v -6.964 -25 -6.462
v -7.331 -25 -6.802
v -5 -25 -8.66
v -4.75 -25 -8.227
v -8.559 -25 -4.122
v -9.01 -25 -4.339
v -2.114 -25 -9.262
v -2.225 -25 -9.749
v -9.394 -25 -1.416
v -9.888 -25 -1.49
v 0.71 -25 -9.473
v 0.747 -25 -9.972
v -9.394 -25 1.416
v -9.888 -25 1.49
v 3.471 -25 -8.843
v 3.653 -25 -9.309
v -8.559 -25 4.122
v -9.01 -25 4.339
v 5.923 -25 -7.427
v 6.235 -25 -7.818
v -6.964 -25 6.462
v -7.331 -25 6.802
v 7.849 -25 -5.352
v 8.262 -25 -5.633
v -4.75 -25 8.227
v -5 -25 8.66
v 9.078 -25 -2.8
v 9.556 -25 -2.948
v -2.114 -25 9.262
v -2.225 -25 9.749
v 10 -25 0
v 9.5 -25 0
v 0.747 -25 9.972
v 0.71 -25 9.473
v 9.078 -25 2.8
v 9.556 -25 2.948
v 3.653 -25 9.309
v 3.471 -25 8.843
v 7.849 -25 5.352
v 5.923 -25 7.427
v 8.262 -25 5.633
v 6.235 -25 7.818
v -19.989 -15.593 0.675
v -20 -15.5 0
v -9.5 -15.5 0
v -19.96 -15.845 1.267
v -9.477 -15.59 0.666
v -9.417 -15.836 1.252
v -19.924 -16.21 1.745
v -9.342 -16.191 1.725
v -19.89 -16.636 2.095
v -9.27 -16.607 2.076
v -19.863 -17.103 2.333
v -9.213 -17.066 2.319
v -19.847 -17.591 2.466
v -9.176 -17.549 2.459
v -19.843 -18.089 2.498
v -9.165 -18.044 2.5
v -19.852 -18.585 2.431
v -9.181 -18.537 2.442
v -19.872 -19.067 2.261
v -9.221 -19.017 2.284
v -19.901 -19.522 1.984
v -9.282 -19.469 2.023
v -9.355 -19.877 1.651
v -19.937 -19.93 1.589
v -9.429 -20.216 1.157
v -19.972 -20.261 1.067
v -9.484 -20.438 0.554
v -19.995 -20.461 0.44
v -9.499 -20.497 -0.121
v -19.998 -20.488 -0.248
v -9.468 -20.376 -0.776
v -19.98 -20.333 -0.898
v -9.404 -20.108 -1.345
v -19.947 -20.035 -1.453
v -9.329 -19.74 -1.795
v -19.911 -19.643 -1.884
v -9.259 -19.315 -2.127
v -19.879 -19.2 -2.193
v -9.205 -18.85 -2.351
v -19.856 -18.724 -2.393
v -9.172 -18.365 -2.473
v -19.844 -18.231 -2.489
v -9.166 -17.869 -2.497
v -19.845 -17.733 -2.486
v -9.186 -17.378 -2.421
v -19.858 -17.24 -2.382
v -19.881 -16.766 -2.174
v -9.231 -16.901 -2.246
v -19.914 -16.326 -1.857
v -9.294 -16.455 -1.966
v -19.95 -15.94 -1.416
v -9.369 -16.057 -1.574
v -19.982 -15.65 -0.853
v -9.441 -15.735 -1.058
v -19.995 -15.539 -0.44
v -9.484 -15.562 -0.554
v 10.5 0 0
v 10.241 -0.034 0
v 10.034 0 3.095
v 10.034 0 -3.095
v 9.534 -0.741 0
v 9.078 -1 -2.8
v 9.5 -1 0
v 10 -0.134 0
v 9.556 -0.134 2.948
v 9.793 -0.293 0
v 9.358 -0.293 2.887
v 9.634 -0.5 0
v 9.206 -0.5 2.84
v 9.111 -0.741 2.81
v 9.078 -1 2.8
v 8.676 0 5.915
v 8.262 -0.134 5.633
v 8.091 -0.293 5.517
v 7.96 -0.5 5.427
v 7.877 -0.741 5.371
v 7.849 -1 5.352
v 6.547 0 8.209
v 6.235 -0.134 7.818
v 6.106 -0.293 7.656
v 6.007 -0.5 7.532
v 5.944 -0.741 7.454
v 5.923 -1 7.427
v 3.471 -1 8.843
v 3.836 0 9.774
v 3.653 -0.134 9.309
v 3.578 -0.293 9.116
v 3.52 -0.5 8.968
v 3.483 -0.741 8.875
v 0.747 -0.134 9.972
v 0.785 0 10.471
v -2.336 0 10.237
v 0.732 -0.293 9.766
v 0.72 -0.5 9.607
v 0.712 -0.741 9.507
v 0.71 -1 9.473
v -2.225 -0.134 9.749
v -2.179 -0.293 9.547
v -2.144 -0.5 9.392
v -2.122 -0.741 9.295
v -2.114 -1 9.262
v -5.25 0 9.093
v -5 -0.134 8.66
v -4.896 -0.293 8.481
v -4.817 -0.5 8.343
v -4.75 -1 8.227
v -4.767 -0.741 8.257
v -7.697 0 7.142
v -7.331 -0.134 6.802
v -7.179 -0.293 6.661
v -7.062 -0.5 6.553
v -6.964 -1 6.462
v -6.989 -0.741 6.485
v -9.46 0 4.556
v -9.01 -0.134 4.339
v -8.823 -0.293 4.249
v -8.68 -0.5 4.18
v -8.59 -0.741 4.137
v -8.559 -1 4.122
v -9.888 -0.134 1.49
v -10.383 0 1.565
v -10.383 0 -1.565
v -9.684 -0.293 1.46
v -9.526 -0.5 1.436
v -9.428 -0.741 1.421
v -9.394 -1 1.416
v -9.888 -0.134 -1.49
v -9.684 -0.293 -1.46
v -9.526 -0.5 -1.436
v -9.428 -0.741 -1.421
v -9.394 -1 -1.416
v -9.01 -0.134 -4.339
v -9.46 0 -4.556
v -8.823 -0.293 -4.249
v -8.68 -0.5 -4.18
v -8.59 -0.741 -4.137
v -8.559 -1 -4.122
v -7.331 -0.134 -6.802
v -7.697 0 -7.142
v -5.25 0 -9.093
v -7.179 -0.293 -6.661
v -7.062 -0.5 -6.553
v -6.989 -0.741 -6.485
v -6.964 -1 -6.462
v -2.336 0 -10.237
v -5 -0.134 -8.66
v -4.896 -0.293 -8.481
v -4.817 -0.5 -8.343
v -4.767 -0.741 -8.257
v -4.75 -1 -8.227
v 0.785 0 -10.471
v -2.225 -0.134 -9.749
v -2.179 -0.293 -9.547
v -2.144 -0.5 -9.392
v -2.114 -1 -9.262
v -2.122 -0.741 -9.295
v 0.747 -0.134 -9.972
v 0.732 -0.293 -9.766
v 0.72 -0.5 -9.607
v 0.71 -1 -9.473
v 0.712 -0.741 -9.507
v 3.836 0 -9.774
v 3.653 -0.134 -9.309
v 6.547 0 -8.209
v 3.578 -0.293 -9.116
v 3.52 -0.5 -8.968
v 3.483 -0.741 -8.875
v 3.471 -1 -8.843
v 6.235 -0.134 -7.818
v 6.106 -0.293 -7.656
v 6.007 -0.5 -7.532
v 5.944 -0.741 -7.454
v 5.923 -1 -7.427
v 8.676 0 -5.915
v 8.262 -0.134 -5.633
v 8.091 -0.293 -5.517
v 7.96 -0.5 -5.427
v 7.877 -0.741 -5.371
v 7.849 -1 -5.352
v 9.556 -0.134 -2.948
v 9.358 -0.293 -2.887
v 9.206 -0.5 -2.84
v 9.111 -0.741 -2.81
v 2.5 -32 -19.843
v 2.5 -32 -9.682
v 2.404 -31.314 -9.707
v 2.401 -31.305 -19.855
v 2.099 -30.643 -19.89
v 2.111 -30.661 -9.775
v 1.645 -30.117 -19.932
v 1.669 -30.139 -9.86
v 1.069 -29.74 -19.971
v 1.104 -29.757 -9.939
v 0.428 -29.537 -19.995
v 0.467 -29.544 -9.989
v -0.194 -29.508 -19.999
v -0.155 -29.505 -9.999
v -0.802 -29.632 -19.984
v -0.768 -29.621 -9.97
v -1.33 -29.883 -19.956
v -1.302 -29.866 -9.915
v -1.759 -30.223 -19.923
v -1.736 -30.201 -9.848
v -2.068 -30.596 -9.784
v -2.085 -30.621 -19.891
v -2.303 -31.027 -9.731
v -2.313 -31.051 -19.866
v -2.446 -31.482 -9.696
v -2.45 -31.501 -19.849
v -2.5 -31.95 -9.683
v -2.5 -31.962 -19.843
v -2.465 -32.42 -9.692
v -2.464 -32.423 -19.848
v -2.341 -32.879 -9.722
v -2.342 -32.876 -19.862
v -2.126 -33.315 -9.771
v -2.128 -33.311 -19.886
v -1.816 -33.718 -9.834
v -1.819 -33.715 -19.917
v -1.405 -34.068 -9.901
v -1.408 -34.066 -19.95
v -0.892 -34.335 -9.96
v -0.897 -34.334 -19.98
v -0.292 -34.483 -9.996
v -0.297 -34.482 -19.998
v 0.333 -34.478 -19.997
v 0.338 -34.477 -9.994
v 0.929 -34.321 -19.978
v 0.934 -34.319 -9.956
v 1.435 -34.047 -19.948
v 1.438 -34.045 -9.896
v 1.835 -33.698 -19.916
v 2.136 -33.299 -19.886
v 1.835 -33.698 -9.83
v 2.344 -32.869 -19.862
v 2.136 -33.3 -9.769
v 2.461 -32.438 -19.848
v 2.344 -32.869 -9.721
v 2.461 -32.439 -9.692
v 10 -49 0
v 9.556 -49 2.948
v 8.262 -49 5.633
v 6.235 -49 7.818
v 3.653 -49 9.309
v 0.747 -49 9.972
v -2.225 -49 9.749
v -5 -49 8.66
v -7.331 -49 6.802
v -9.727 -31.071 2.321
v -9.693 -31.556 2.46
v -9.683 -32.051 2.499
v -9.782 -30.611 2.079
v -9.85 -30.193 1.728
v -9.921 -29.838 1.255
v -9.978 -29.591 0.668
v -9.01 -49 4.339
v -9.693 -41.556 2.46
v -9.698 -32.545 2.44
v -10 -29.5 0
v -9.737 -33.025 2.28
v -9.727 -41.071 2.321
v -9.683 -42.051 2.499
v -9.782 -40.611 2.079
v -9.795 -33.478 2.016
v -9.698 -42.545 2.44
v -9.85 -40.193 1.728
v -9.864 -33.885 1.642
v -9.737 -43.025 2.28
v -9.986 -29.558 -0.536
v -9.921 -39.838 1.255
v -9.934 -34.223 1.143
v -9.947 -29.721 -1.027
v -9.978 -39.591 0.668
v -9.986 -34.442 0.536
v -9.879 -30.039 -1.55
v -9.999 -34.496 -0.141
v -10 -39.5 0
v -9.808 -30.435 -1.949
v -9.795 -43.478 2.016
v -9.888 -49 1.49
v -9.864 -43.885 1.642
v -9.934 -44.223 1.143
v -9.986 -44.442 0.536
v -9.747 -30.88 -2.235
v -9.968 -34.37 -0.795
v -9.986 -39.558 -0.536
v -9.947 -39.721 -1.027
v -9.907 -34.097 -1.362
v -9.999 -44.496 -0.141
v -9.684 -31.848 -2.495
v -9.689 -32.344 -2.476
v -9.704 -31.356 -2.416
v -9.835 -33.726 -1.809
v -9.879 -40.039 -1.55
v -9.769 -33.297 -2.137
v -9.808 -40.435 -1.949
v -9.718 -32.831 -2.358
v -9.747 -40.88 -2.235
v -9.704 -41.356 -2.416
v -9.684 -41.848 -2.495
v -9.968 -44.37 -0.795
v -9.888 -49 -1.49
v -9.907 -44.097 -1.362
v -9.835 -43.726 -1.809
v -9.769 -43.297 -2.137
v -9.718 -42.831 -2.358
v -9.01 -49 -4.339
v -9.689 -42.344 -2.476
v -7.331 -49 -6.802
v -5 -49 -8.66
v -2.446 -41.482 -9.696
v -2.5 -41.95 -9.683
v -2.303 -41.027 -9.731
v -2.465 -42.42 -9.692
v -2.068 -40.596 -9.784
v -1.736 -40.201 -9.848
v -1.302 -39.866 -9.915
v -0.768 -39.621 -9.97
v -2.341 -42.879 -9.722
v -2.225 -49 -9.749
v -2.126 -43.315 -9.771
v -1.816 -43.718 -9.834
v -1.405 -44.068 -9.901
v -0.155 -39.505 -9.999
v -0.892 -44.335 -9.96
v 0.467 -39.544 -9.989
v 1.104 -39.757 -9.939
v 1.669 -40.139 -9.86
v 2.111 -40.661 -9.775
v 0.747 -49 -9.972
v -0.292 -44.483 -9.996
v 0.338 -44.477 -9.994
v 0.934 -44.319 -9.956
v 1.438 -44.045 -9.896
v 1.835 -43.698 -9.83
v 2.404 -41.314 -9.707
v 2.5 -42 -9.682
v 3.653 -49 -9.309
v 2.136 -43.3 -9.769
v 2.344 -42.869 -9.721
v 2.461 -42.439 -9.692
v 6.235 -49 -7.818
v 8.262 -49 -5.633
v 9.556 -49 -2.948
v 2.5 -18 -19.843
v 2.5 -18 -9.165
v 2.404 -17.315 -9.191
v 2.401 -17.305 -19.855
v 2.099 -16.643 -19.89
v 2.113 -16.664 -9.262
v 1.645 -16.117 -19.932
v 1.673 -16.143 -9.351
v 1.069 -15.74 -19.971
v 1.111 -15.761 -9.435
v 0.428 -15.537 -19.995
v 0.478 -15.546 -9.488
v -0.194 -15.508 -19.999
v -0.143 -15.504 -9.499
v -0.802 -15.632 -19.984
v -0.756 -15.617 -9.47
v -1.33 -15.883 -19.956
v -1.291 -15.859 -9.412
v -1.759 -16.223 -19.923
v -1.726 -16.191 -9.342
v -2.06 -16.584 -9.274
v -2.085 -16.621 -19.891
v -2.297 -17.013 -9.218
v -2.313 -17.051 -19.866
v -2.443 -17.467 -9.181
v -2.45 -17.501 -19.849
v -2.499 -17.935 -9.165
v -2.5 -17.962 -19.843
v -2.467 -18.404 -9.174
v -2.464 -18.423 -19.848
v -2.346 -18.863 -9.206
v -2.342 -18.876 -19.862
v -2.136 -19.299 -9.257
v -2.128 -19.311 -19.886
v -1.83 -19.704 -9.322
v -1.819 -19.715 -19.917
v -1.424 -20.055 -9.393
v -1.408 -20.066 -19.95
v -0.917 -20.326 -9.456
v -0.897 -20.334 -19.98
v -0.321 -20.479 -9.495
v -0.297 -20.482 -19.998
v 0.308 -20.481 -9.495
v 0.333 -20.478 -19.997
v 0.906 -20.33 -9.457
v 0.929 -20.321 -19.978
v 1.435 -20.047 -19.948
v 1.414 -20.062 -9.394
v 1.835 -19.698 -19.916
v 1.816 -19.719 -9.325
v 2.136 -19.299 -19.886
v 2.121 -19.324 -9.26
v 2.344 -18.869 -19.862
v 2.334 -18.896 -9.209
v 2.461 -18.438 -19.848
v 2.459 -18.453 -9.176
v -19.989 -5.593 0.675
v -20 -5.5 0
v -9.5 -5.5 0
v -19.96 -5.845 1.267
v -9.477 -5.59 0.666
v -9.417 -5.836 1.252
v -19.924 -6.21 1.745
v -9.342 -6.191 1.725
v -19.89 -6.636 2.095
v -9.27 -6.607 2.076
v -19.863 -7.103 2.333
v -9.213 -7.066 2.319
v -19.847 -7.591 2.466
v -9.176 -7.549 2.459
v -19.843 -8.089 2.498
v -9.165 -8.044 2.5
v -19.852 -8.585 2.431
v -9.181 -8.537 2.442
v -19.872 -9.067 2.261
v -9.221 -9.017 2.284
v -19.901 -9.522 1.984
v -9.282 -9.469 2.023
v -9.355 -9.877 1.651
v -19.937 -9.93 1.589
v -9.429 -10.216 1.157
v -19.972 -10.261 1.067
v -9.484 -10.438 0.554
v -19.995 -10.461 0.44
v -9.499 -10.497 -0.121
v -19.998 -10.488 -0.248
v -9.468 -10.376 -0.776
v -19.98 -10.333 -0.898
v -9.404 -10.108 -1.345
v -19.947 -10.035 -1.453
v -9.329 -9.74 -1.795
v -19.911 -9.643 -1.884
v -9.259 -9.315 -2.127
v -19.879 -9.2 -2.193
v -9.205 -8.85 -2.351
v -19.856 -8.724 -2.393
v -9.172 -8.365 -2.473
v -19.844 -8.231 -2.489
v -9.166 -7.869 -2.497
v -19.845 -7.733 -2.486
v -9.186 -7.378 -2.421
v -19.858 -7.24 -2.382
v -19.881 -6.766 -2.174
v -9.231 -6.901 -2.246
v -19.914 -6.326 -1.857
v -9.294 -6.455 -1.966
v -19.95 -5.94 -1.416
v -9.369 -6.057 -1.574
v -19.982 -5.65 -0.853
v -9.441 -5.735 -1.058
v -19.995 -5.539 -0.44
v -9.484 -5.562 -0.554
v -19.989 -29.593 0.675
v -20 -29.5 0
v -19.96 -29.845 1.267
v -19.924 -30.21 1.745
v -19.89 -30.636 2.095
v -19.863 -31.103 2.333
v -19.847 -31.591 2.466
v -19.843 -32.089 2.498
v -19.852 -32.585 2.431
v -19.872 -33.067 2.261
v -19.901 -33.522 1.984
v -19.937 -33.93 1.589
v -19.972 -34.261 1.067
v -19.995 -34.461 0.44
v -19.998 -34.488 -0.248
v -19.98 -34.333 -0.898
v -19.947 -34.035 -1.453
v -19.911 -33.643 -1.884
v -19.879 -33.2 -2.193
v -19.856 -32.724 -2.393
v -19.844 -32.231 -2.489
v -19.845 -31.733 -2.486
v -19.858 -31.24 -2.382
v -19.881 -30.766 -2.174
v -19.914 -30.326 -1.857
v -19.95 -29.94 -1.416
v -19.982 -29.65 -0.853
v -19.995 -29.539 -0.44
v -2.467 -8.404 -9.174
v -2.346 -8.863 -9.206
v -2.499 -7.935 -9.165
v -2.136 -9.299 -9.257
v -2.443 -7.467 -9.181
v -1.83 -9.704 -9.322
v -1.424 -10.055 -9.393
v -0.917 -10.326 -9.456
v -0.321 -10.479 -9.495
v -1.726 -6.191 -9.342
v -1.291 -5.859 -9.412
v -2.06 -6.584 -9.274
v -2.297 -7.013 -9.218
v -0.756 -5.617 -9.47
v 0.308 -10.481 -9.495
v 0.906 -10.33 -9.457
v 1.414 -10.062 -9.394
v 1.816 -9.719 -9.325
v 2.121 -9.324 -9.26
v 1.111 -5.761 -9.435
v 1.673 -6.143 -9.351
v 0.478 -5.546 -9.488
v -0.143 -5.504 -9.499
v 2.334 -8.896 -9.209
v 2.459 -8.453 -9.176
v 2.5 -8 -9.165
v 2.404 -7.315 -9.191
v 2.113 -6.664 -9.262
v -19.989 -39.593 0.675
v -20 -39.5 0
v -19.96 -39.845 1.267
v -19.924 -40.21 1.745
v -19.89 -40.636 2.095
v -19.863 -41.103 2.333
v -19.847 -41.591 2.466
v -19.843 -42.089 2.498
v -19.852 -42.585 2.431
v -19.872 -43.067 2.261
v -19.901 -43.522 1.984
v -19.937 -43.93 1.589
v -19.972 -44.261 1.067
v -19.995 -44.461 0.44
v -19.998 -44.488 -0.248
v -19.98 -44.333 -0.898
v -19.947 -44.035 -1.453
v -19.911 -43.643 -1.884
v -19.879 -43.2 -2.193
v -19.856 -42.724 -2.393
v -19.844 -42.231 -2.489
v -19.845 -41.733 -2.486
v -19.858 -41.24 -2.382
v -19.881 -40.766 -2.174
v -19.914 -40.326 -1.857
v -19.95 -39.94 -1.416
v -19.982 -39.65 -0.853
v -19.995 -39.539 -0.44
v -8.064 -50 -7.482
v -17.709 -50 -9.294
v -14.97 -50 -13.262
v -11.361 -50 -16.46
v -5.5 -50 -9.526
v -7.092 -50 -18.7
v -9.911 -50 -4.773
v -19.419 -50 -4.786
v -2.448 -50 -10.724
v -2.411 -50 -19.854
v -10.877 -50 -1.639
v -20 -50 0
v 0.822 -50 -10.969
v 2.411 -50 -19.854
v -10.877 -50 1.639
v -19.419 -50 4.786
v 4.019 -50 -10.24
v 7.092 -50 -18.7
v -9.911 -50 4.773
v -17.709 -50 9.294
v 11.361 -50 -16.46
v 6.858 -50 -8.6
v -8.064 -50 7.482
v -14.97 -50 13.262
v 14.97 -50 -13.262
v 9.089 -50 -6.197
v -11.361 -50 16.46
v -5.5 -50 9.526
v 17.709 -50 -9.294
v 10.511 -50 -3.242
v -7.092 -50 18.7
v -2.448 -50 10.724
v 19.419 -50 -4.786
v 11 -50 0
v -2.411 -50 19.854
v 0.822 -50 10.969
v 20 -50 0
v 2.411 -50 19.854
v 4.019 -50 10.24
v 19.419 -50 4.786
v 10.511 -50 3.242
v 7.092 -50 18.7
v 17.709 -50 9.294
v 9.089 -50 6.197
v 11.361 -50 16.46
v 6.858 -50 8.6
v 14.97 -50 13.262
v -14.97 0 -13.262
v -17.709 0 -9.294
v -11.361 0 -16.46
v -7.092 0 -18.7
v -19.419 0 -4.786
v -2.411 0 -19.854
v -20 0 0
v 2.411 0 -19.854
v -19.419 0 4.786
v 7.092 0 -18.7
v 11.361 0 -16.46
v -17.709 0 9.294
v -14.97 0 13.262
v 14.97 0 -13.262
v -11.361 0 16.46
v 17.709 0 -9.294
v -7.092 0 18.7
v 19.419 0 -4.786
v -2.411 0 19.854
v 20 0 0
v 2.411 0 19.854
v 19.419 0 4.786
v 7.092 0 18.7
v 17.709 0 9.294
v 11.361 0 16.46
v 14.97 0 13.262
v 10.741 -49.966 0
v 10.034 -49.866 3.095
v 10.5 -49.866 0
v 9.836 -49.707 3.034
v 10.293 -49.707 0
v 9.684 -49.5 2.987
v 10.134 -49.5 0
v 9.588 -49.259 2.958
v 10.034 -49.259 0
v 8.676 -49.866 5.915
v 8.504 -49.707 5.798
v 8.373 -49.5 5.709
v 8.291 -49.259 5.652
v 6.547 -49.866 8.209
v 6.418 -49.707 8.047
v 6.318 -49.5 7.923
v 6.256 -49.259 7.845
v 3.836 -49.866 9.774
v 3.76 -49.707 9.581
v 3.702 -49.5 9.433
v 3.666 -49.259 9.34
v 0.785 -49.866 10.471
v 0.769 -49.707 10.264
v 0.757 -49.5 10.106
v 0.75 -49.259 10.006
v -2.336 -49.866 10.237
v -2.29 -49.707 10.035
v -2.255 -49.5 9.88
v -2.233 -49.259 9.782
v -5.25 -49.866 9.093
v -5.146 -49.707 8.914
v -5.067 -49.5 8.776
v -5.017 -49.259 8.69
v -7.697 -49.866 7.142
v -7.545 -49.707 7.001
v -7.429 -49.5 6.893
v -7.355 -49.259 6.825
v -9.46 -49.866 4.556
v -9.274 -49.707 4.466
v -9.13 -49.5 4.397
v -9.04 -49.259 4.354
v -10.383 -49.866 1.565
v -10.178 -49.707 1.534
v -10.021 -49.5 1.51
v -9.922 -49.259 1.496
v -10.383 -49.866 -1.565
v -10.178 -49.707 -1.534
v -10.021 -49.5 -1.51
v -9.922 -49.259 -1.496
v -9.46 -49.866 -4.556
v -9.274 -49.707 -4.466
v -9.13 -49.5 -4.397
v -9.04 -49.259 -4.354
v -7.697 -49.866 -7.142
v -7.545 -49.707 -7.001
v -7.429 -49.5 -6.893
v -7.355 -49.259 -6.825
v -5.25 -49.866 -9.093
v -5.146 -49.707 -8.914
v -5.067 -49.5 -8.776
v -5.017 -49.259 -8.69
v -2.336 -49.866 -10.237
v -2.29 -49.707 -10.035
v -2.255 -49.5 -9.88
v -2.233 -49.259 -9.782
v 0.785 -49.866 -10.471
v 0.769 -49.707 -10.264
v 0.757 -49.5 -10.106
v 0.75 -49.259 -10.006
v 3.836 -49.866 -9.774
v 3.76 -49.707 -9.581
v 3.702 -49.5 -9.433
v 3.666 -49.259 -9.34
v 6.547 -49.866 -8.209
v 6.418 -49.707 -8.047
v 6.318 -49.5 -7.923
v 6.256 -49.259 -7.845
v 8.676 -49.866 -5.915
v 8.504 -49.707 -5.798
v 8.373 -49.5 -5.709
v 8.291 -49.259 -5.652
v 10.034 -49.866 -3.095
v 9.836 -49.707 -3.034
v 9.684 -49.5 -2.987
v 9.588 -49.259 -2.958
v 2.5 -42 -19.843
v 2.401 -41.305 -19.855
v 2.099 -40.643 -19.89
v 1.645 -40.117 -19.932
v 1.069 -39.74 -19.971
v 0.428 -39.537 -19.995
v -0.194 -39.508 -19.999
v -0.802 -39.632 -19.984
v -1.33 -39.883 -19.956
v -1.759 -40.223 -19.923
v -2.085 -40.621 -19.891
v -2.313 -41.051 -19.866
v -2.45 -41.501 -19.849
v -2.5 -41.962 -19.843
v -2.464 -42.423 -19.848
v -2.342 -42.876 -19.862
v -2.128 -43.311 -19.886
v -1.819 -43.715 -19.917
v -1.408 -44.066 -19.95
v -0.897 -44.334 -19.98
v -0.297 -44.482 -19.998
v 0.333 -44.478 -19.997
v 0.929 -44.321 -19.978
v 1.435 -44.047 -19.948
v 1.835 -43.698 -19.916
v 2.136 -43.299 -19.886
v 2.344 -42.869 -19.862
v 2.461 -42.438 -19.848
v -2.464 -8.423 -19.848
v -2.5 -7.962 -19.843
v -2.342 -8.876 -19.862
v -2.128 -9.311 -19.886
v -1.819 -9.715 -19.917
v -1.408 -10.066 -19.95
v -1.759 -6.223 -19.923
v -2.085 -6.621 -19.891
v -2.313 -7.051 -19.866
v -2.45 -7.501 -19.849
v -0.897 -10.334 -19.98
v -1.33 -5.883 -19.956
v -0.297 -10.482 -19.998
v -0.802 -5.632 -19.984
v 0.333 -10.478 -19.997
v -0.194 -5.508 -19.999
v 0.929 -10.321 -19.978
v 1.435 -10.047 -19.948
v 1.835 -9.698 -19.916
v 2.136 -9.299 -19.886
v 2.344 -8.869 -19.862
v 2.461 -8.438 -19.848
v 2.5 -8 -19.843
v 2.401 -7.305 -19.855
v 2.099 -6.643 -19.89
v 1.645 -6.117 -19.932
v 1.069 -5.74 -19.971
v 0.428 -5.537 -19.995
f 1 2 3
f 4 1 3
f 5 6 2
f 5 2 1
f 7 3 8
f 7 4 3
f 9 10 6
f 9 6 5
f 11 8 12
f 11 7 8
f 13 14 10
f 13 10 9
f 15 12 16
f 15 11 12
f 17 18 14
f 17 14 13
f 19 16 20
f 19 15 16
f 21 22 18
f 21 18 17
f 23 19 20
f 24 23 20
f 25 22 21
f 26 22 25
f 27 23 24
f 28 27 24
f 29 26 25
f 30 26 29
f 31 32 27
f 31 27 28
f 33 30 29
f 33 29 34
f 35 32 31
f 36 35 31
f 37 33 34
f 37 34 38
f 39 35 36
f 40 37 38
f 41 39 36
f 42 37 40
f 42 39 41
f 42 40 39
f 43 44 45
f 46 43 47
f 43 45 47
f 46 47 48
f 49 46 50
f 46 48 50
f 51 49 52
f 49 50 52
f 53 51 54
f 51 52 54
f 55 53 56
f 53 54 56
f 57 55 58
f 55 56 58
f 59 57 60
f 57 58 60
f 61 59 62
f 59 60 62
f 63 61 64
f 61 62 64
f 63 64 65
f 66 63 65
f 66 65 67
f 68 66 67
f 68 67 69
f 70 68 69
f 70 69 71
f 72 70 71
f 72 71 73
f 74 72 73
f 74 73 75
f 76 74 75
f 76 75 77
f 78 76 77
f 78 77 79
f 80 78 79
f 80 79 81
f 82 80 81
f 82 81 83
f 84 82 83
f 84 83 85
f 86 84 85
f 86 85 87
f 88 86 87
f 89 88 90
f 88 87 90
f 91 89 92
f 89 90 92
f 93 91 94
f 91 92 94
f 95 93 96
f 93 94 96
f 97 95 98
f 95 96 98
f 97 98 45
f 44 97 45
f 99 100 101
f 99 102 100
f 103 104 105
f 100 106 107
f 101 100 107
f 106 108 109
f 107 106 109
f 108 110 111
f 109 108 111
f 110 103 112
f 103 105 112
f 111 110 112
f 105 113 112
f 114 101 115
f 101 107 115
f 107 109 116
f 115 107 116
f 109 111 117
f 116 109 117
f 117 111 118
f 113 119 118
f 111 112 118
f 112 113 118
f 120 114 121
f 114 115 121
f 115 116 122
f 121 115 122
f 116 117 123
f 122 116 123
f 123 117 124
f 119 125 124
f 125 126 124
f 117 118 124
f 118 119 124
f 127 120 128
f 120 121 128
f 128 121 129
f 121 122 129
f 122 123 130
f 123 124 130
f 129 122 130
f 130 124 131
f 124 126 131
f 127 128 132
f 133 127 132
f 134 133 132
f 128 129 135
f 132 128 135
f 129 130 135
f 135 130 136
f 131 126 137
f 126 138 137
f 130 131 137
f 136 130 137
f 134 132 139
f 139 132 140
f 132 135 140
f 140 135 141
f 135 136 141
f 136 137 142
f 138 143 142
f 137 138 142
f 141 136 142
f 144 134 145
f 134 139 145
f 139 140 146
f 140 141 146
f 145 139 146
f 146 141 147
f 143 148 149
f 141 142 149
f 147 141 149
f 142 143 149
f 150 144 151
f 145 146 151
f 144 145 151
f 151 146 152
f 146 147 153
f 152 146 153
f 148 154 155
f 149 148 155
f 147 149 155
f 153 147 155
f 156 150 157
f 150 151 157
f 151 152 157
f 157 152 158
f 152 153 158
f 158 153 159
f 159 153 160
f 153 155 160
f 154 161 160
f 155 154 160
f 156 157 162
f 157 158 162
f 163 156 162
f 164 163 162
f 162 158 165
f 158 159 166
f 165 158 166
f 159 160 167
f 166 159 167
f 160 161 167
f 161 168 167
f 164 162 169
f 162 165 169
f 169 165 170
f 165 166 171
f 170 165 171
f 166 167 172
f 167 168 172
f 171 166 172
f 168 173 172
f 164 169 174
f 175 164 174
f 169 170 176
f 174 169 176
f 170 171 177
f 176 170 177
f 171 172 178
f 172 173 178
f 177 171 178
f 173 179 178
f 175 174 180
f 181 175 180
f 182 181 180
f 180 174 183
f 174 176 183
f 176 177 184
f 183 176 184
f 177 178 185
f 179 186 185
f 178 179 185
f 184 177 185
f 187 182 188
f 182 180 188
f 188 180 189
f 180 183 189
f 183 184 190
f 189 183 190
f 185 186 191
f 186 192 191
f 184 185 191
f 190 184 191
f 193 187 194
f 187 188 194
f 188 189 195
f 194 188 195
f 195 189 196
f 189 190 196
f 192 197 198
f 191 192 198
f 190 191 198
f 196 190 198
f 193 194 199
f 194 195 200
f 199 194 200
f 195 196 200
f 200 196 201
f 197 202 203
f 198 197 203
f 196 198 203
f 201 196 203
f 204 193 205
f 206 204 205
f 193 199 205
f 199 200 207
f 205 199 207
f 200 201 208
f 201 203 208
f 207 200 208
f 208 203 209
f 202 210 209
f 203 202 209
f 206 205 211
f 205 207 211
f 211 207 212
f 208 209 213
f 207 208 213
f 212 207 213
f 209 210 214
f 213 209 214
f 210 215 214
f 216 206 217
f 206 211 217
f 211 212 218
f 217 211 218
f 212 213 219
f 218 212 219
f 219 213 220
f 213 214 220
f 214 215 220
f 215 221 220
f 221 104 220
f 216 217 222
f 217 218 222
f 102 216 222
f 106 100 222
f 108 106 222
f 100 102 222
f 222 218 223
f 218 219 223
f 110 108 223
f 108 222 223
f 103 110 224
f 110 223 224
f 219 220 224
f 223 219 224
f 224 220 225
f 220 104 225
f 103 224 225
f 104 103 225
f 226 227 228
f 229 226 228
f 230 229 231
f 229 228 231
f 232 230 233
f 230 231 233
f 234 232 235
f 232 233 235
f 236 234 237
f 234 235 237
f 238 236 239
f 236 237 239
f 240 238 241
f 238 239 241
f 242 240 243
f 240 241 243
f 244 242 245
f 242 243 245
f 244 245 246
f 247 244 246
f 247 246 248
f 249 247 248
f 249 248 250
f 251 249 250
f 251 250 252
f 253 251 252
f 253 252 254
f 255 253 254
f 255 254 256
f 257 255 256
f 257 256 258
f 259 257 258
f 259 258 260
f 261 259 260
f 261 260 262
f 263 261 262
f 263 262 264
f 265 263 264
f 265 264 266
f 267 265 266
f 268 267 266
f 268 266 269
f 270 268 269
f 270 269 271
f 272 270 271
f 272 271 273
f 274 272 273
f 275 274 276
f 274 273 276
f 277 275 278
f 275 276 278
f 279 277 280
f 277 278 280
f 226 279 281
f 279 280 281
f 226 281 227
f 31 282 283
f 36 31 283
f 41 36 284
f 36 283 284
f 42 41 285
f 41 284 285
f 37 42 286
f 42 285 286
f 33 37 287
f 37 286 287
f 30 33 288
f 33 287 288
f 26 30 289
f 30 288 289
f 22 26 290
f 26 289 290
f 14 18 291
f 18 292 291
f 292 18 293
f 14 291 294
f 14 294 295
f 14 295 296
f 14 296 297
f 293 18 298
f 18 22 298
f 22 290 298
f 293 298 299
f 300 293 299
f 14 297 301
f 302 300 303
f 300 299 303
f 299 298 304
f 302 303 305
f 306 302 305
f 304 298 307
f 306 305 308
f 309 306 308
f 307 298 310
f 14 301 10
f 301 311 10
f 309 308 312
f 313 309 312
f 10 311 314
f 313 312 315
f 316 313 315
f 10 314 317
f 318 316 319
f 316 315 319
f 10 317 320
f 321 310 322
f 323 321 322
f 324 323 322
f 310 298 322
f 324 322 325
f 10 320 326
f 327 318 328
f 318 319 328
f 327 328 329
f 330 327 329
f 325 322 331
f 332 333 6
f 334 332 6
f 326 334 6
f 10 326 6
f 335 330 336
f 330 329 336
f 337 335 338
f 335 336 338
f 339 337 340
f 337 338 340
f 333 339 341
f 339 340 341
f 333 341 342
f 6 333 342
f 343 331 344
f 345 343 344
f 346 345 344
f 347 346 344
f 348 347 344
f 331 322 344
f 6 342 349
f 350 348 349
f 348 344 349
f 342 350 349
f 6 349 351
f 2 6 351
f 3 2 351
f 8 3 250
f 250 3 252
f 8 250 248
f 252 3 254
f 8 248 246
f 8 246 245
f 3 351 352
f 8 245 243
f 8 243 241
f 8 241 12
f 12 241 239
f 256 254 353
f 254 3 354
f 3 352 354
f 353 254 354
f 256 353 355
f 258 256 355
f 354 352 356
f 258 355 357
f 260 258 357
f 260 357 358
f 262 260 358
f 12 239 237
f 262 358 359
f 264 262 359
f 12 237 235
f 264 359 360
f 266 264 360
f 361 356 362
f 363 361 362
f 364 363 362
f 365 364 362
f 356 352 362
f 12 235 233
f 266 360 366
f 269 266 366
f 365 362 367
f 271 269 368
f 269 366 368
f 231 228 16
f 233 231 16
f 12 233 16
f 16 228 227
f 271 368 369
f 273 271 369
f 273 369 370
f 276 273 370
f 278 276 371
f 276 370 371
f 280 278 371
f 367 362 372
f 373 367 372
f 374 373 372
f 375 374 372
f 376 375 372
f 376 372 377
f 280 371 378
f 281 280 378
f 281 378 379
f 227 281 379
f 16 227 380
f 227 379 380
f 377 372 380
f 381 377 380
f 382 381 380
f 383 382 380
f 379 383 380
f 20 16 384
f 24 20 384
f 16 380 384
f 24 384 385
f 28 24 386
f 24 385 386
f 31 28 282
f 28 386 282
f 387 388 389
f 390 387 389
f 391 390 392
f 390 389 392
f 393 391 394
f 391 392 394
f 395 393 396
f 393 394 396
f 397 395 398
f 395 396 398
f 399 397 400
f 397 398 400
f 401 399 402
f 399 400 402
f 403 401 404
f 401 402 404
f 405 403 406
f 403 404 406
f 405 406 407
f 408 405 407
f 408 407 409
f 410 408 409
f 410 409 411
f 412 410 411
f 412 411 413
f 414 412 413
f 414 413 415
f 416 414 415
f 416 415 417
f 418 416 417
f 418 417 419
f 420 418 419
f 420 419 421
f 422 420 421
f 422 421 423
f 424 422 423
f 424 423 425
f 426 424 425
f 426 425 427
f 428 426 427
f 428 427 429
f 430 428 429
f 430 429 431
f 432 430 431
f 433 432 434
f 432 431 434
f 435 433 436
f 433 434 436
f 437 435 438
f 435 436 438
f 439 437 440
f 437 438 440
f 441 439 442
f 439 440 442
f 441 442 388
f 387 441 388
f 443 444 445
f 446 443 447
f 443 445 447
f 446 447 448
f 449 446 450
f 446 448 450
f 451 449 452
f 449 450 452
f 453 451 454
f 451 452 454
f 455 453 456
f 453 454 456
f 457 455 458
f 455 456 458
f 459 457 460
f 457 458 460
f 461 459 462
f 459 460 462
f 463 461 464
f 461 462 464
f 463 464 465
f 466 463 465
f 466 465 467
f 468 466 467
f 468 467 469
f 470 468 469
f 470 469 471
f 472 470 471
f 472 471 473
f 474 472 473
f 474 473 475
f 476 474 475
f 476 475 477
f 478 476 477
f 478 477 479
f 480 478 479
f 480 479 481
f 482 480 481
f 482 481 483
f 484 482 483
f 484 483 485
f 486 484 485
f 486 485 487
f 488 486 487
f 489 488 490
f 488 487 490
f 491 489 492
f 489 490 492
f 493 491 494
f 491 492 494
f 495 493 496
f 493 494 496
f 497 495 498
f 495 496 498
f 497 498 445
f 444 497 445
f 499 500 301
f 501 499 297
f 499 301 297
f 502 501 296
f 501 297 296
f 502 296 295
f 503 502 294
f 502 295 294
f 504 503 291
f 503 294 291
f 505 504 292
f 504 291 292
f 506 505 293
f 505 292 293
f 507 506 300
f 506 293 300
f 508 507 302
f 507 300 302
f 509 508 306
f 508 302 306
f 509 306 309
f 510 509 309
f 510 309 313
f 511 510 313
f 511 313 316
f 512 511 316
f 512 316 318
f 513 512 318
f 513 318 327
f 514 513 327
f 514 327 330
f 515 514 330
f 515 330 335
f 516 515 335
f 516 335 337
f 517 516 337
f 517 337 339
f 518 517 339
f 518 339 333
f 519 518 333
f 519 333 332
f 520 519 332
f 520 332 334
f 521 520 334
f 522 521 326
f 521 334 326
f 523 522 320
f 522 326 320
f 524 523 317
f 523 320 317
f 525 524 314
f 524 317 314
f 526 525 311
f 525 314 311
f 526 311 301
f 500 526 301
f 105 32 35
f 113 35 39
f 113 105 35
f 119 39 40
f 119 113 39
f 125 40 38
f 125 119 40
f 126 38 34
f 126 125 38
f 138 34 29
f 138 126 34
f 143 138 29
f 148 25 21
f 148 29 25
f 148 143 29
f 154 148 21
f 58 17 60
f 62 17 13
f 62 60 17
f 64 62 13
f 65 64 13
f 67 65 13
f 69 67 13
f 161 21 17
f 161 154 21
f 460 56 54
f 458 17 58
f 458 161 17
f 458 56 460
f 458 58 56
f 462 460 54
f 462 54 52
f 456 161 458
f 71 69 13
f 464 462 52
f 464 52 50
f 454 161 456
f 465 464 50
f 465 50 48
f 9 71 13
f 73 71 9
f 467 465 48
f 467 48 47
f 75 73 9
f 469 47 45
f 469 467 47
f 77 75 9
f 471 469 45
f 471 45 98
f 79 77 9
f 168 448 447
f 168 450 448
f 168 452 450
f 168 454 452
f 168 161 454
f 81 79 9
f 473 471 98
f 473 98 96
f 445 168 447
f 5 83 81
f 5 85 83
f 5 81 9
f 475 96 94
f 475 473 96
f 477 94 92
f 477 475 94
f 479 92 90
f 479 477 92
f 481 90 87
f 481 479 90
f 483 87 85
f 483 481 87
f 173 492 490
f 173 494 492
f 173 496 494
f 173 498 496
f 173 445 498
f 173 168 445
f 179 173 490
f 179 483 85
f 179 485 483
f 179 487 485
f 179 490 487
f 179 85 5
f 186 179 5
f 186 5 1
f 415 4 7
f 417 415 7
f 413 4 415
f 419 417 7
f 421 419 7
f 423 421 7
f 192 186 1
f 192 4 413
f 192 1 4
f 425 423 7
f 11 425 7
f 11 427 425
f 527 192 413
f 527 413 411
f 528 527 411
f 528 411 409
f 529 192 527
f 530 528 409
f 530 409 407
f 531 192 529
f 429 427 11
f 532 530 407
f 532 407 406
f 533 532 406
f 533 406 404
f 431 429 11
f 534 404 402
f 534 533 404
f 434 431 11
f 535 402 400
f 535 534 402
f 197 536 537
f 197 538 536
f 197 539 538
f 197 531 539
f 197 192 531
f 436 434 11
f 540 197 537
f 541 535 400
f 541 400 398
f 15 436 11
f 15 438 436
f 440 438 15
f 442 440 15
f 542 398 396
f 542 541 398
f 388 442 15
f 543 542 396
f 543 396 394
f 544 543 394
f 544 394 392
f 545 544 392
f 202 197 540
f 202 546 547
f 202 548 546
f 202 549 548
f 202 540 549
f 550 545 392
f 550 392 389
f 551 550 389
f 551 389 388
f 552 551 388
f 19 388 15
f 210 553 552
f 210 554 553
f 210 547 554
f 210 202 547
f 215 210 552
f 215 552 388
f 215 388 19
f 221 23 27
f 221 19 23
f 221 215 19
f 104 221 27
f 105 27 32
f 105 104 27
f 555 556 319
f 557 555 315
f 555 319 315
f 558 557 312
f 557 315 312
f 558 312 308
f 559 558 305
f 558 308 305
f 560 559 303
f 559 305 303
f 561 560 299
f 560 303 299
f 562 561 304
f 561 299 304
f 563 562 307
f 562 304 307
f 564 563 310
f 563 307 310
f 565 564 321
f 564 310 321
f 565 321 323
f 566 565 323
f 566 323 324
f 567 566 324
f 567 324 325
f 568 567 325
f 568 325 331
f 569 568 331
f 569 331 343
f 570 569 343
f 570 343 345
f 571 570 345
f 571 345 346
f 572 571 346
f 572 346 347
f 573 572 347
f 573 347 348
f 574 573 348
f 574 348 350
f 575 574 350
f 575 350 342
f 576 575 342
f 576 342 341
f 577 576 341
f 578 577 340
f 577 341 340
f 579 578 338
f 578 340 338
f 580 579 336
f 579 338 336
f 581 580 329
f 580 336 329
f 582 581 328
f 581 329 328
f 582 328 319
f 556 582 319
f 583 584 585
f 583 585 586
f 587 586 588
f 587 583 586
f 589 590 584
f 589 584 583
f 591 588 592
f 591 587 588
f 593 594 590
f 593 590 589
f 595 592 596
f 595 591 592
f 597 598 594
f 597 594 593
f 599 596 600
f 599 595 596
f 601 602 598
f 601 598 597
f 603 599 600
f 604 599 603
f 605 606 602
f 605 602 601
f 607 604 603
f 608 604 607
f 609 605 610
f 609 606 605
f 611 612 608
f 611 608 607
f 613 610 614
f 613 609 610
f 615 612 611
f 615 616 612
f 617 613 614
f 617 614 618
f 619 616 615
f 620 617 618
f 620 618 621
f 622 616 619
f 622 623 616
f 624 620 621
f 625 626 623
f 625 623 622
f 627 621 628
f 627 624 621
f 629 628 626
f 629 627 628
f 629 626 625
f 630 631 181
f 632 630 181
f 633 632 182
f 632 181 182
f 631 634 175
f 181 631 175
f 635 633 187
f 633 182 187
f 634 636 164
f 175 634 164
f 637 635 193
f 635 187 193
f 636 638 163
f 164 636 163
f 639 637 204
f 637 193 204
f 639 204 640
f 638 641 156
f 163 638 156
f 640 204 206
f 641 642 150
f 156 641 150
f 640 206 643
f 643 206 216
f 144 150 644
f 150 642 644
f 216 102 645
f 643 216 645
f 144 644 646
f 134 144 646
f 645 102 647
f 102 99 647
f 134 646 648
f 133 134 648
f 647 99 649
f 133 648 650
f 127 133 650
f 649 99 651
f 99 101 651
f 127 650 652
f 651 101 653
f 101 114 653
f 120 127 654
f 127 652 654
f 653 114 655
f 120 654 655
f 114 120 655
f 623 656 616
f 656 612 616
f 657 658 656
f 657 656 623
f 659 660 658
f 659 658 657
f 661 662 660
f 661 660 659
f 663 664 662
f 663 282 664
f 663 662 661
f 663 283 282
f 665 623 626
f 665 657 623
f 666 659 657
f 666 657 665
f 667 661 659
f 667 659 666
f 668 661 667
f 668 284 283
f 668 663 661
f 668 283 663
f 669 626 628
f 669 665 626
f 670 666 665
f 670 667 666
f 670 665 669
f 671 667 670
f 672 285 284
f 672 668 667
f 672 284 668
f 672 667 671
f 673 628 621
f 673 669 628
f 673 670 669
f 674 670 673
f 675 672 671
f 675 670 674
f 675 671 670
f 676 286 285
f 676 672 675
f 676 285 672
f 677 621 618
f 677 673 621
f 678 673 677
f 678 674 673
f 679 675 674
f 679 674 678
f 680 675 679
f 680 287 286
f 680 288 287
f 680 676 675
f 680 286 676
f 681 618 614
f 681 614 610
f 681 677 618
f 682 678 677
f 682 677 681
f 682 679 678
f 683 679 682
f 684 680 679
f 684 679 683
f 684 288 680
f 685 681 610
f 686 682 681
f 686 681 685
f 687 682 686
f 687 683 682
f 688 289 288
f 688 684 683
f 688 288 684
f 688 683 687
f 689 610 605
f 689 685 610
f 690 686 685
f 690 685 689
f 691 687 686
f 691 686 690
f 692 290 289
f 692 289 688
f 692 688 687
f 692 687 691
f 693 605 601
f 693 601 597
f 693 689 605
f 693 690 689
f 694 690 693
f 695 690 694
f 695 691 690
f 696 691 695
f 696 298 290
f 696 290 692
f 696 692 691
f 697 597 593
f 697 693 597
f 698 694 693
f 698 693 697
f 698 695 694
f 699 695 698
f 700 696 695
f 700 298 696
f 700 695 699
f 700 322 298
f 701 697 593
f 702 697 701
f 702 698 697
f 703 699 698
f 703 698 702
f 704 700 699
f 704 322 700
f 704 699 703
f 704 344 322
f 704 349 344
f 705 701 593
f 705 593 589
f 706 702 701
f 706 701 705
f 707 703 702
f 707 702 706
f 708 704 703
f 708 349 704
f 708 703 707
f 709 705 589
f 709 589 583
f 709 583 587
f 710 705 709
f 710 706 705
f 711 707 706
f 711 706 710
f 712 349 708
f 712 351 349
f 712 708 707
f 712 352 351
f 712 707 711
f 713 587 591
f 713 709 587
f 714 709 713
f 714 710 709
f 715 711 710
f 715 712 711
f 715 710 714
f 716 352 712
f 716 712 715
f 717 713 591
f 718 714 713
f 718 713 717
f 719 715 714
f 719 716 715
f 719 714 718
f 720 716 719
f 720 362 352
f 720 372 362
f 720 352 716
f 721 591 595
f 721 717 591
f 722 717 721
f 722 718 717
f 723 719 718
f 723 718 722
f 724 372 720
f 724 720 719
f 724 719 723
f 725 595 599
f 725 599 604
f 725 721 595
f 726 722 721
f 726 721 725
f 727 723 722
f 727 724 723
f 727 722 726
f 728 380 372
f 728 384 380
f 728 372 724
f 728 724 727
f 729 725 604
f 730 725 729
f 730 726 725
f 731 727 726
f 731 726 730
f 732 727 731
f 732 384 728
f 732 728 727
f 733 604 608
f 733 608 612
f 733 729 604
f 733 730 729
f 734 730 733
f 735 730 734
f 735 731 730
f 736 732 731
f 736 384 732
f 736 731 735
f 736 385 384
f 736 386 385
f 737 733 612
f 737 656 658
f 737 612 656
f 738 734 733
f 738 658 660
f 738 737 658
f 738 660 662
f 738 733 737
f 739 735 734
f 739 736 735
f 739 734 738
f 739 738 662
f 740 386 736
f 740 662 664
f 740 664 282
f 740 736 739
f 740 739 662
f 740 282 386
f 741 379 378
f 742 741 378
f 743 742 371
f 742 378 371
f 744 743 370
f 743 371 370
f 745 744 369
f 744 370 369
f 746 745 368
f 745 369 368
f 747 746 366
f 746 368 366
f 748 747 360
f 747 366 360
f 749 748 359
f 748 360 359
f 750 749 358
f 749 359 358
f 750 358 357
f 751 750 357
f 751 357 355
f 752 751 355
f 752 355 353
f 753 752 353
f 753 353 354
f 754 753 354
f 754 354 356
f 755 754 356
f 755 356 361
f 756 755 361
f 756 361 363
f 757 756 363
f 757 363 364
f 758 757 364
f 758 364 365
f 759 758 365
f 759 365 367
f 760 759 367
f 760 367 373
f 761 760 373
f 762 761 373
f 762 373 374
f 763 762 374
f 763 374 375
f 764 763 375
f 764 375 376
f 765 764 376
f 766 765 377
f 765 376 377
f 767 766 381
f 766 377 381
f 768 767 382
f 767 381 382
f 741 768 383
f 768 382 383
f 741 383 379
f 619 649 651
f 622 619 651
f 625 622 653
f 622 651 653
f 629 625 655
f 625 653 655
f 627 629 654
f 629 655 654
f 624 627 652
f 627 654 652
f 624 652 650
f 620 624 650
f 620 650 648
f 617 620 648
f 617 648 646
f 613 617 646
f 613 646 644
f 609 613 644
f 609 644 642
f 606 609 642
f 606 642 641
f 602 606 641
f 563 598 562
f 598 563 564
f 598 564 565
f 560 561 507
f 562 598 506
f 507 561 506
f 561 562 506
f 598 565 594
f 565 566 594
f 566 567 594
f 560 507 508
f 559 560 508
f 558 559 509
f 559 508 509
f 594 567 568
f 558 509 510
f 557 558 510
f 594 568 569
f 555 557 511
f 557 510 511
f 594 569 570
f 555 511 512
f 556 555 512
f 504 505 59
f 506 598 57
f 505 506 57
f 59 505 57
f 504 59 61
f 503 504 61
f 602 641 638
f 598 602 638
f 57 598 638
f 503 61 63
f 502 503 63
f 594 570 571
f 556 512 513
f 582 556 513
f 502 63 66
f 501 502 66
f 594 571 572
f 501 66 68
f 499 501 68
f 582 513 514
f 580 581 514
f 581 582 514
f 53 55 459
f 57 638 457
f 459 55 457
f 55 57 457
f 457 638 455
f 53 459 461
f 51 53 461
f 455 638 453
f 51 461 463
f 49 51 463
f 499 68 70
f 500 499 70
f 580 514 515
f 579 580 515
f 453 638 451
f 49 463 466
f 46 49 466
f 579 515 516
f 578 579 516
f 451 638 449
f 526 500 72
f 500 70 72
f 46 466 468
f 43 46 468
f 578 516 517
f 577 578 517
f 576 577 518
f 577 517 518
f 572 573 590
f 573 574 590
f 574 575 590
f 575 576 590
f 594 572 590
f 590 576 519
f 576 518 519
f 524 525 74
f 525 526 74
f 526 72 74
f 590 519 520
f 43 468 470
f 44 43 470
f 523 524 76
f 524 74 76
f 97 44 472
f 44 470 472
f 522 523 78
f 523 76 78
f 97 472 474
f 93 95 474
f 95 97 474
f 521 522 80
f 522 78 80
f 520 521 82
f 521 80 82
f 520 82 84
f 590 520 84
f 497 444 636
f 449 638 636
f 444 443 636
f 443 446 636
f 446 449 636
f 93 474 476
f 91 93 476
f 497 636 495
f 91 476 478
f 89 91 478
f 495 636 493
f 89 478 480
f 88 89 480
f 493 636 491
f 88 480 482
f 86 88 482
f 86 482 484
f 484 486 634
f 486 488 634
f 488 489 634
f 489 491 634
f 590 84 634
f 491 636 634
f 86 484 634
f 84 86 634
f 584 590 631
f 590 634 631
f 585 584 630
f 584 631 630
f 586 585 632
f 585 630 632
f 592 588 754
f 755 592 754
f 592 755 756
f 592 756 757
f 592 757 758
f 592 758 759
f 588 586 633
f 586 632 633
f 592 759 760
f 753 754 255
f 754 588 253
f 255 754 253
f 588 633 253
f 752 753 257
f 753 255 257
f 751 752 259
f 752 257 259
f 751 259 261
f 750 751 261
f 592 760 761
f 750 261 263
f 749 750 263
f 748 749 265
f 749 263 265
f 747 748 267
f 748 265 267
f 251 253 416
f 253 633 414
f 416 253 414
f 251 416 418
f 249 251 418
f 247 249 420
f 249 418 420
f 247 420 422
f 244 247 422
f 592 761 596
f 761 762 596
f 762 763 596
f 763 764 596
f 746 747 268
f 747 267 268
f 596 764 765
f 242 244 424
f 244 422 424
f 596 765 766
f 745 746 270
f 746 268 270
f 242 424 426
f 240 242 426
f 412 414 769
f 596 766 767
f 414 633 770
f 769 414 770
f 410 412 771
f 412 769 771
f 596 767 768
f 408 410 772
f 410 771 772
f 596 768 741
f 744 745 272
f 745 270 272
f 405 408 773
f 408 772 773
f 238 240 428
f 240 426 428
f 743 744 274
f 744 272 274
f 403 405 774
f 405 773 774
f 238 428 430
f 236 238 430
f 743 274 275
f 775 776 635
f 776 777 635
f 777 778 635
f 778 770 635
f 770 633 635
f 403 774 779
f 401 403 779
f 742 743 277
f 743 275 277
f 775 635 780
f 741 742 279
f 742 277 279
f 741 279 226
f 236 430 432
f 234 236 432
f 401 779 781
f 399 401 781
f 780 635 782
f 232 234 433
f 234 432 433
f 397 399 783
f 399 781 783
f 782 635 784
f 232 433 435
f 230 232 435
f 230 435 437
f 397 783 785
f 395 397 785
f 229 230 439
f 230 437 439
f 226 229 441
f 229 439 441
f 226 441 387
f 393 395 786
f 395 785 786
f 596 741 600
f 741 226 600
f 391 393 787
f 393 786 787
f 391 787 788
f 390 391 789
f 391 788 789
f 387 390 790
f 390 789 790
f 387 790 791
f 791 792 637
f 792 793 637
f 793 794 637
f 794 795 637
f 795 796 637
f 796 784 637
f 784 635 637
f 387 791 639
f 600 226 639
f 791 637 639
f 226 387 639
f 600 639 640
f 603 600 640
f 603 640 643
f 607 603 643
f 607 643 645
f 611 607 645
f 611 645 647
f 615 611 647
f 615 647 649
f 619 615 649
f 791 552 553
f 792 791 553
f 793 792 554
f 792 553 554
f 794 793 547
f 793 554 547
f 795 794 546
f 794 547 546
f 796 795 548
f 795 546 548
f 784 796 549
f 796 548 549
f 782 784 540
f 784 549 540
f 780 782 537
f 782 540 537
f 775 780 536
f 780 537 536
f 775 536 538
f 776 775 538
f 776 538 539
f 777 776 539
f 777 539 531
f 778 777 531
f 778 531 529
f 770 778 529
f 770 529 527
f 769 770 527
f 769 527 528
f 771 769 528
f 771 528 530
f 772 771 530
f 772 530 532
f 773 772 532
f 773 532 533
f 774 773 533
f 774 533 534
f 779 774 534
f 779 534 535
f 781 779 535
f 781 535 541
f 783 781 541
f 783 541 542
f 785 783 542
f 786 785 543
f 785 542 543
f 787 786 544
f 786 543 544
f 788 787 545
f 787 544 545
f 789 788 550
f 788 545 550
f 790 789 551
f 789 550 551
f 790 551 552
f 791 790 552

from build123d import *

# Parameters (mm, degrees)
F0_R     = 20
F0_R_2   = 9.5
F1_DEPTH = 50
F2_R     = 10
F3_DEPTH = 25
F5_D     = 5
F5_DEPTH = 50
F5_TIP   = 1.5021515476
F7_D     = 5
F7_DEPTH = 50
F7_TIP   = 1.5021515476
F8_R     = 1


with BuildPart() as f1:
    # F0 (on Front) → F1 (new body)
    with BuildSketch(Plane.XZ):
        Circle(F0_R)
        Circle(F0_R_2, mode=Mode.SUBTRACT)
    extrude(amount=F1_DEPTH)

    # F2 (on face) → F3 (cut)
    with BuildSketch(Plane.XZ.offset(50)):
        Circle(F2_R)
    extrude(amount=-F3_DEPTH, mode=Mode.SUBTRACT)

    # F5 (one way)
    with BuildSketch(Plane.YZ):
        with Locations((-42, 0), (-32, 0), (-18, 0), (-8, 0)):
            Circle(F5_D / 2)
    extrude(amount=-F5_DEPTH, mode=Mode.SUBTRACT)
    with Locations(Plane.YZ):
        with Locations((-42, 0), (-32, 0), (-18, 0), (-8, 0)):
            with Locations((0, 0, -(F5_DEPTH + F5_TIP / 2))):  # 118° drill point
                Cone(0, F5_D / 2, F5_TIP, mode=Mode.SUBTRACT)

    # F7 (one way)
    with BuildSketch(Plane.XY):
        with Locations((0, -8), (0, -18), (0, -32), (0, -42)):
            Circle(F7_D / 2)
    extrude(amount=-F7_DEPTH, mode=Mode.SUBTRACT)
    with Locations(Plane.XY):
        with Locations((0, -8), (0, -18), (0, -32), (0, -42)):
            with Locations((0, 0, -(F7_DEPTH + F7_TIP / 2))):  # 118° drill point
                Cone(0, F7_D / 2, F7_TIP, mode=Mode.SUBTRACT)

    # F8
    f8_edges = [f1.edges().sort_by_distance(p)[0] for p in [
        (-9.5, 0, 0),
        (-10, -50, 0),
    ]]
    fillet(f8_edges, radius=F8_R)


solid = f1.part
